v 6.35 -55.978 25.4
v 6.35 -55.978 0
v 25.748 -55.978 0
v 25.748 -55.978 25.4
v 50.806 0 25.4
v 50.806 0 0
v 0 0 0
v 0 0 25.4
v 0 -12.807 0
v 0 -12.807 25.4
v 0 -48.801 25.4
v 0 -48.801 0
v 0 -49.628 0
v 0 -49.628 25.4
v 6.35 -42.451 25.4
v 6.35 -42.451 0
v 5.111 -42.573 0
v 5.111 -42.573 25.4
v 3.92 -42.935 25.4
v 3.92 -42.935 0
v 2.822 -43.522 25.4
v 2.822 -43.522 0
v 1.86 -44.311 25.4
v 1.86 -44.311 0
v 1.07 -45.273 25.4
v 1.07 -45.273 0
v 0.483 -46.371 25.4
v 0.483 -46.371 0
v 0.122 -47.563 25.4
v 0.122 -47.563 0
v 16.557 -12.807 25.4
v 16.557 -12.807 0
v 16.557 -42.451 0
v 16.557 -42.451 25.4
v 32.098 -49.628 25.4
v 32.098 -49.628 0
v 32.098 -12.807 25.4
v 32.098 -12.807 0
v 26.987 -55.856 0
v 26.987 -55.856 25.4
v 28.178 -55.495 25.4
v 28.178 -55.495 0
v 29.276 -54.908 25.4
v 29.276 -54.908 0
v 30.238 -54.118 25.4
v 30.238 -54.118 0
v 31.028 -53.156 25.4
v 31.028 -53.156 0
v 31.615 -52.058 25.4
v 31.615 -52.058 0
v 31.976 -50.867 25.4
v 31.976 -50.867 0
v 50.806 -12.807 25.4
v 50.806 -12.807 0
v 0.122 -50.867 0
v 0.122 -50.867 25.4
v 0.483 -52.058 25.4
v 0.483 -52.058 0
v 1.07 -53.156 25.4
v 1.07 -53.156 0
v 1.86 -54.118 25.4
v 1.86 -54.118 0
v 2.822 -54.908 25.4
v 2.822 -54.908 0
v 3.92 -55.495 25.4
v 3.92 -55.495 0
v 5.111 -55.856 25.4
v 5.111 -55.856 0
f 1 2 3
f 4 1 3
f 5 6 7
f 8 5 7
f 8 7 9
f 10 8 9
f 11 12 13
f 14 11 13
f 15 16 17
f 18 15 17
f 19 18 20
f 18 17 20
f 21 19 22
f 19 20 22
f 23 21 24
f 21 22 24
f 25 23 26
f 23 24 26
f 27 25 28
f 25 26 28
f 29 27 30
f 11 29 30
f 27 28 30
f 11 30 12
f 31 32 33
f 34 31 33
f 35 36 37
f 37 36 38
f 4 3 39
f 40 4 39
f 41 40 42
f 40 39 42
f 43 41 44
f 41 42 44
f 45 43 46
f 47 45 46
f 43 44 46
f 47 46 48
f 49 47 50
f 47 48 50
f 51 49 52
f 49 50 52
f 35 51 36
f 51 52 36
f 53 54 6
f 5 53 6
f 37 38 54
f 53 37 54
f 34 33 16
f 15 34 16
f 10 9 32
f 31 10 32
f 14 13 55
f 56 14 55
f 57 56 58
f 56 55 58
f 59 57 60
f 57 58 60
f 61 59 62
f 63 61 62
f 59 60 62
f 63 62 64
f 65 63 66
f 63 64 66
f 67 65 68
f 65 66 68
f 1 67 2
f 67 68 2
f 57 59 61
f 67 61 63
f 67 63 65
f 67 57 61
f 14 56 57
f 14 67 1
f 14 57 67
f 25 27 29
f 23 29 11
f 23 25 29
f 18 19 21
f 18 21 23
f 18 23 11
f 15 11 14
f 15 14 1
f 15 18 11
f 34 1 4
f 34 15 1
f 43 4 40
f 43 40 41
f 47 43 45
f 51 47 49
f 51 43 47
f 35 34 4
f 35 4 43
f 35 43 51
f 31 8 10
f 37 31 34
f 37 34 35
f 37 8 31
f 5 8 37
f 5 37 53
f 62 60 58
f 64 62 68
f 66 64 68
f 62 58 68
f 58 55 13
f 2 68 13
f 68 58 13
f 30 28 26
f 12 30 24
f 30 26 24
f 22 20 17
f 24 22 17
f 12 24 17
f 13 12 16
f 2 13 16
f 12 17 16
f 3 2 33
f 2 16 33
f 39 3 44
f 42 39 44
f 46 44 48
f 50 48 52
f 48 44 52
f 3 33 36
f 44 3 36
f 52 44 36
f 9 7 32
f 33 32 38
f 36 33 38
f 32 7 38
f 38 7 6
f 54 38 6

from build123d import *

# Parameters (mm, degrees)
F1_DEPTH = 25.4


with BuildPart() as f1:
    # F0 (on Top) → F1 (new body)
    with BuildSketch(Plane.XY):
        with BuildLine():
            Line((50.805587, 0), (0, 0))
            Line((0, 0), (0, -12.807356))
            Line((0, -12.807356), (16.556706, -12.807356))
            Line((16.556706, -12.807356), (16.556706, -42.451348))
            Line((16.556706, -42.451348), (6.35, -42.451348))
            ThreePointArc((6.35, -42.451348), (1.859872, -44.31122), (0, -48.801348))
            Line((0, -48.801348), (0, -49.62822))
            ThreePointArc((0, -49.62822), (1.859872, -54.118348), (6.35, -55.97822))
            Line((6.35, -55.97822), (25.748219, -55.97822))
            ThreePointArc((25.748219, -55.97822), (30.238347, -54.118348), (32.098219, -49.62822))
            Line((32.098219, -49.62822), (32.098219, -42.451348))
            Line((32.098219, -42.451348), (32.098219, -12.807356))
            Line((32.098219, -12.807356), (50.805587, -12.807356))
            Line((50.805587, -12.807356), (50.805587, 0))
        make_face()
    extrude(amount=F1_DEPTH)


solid = f1.part
